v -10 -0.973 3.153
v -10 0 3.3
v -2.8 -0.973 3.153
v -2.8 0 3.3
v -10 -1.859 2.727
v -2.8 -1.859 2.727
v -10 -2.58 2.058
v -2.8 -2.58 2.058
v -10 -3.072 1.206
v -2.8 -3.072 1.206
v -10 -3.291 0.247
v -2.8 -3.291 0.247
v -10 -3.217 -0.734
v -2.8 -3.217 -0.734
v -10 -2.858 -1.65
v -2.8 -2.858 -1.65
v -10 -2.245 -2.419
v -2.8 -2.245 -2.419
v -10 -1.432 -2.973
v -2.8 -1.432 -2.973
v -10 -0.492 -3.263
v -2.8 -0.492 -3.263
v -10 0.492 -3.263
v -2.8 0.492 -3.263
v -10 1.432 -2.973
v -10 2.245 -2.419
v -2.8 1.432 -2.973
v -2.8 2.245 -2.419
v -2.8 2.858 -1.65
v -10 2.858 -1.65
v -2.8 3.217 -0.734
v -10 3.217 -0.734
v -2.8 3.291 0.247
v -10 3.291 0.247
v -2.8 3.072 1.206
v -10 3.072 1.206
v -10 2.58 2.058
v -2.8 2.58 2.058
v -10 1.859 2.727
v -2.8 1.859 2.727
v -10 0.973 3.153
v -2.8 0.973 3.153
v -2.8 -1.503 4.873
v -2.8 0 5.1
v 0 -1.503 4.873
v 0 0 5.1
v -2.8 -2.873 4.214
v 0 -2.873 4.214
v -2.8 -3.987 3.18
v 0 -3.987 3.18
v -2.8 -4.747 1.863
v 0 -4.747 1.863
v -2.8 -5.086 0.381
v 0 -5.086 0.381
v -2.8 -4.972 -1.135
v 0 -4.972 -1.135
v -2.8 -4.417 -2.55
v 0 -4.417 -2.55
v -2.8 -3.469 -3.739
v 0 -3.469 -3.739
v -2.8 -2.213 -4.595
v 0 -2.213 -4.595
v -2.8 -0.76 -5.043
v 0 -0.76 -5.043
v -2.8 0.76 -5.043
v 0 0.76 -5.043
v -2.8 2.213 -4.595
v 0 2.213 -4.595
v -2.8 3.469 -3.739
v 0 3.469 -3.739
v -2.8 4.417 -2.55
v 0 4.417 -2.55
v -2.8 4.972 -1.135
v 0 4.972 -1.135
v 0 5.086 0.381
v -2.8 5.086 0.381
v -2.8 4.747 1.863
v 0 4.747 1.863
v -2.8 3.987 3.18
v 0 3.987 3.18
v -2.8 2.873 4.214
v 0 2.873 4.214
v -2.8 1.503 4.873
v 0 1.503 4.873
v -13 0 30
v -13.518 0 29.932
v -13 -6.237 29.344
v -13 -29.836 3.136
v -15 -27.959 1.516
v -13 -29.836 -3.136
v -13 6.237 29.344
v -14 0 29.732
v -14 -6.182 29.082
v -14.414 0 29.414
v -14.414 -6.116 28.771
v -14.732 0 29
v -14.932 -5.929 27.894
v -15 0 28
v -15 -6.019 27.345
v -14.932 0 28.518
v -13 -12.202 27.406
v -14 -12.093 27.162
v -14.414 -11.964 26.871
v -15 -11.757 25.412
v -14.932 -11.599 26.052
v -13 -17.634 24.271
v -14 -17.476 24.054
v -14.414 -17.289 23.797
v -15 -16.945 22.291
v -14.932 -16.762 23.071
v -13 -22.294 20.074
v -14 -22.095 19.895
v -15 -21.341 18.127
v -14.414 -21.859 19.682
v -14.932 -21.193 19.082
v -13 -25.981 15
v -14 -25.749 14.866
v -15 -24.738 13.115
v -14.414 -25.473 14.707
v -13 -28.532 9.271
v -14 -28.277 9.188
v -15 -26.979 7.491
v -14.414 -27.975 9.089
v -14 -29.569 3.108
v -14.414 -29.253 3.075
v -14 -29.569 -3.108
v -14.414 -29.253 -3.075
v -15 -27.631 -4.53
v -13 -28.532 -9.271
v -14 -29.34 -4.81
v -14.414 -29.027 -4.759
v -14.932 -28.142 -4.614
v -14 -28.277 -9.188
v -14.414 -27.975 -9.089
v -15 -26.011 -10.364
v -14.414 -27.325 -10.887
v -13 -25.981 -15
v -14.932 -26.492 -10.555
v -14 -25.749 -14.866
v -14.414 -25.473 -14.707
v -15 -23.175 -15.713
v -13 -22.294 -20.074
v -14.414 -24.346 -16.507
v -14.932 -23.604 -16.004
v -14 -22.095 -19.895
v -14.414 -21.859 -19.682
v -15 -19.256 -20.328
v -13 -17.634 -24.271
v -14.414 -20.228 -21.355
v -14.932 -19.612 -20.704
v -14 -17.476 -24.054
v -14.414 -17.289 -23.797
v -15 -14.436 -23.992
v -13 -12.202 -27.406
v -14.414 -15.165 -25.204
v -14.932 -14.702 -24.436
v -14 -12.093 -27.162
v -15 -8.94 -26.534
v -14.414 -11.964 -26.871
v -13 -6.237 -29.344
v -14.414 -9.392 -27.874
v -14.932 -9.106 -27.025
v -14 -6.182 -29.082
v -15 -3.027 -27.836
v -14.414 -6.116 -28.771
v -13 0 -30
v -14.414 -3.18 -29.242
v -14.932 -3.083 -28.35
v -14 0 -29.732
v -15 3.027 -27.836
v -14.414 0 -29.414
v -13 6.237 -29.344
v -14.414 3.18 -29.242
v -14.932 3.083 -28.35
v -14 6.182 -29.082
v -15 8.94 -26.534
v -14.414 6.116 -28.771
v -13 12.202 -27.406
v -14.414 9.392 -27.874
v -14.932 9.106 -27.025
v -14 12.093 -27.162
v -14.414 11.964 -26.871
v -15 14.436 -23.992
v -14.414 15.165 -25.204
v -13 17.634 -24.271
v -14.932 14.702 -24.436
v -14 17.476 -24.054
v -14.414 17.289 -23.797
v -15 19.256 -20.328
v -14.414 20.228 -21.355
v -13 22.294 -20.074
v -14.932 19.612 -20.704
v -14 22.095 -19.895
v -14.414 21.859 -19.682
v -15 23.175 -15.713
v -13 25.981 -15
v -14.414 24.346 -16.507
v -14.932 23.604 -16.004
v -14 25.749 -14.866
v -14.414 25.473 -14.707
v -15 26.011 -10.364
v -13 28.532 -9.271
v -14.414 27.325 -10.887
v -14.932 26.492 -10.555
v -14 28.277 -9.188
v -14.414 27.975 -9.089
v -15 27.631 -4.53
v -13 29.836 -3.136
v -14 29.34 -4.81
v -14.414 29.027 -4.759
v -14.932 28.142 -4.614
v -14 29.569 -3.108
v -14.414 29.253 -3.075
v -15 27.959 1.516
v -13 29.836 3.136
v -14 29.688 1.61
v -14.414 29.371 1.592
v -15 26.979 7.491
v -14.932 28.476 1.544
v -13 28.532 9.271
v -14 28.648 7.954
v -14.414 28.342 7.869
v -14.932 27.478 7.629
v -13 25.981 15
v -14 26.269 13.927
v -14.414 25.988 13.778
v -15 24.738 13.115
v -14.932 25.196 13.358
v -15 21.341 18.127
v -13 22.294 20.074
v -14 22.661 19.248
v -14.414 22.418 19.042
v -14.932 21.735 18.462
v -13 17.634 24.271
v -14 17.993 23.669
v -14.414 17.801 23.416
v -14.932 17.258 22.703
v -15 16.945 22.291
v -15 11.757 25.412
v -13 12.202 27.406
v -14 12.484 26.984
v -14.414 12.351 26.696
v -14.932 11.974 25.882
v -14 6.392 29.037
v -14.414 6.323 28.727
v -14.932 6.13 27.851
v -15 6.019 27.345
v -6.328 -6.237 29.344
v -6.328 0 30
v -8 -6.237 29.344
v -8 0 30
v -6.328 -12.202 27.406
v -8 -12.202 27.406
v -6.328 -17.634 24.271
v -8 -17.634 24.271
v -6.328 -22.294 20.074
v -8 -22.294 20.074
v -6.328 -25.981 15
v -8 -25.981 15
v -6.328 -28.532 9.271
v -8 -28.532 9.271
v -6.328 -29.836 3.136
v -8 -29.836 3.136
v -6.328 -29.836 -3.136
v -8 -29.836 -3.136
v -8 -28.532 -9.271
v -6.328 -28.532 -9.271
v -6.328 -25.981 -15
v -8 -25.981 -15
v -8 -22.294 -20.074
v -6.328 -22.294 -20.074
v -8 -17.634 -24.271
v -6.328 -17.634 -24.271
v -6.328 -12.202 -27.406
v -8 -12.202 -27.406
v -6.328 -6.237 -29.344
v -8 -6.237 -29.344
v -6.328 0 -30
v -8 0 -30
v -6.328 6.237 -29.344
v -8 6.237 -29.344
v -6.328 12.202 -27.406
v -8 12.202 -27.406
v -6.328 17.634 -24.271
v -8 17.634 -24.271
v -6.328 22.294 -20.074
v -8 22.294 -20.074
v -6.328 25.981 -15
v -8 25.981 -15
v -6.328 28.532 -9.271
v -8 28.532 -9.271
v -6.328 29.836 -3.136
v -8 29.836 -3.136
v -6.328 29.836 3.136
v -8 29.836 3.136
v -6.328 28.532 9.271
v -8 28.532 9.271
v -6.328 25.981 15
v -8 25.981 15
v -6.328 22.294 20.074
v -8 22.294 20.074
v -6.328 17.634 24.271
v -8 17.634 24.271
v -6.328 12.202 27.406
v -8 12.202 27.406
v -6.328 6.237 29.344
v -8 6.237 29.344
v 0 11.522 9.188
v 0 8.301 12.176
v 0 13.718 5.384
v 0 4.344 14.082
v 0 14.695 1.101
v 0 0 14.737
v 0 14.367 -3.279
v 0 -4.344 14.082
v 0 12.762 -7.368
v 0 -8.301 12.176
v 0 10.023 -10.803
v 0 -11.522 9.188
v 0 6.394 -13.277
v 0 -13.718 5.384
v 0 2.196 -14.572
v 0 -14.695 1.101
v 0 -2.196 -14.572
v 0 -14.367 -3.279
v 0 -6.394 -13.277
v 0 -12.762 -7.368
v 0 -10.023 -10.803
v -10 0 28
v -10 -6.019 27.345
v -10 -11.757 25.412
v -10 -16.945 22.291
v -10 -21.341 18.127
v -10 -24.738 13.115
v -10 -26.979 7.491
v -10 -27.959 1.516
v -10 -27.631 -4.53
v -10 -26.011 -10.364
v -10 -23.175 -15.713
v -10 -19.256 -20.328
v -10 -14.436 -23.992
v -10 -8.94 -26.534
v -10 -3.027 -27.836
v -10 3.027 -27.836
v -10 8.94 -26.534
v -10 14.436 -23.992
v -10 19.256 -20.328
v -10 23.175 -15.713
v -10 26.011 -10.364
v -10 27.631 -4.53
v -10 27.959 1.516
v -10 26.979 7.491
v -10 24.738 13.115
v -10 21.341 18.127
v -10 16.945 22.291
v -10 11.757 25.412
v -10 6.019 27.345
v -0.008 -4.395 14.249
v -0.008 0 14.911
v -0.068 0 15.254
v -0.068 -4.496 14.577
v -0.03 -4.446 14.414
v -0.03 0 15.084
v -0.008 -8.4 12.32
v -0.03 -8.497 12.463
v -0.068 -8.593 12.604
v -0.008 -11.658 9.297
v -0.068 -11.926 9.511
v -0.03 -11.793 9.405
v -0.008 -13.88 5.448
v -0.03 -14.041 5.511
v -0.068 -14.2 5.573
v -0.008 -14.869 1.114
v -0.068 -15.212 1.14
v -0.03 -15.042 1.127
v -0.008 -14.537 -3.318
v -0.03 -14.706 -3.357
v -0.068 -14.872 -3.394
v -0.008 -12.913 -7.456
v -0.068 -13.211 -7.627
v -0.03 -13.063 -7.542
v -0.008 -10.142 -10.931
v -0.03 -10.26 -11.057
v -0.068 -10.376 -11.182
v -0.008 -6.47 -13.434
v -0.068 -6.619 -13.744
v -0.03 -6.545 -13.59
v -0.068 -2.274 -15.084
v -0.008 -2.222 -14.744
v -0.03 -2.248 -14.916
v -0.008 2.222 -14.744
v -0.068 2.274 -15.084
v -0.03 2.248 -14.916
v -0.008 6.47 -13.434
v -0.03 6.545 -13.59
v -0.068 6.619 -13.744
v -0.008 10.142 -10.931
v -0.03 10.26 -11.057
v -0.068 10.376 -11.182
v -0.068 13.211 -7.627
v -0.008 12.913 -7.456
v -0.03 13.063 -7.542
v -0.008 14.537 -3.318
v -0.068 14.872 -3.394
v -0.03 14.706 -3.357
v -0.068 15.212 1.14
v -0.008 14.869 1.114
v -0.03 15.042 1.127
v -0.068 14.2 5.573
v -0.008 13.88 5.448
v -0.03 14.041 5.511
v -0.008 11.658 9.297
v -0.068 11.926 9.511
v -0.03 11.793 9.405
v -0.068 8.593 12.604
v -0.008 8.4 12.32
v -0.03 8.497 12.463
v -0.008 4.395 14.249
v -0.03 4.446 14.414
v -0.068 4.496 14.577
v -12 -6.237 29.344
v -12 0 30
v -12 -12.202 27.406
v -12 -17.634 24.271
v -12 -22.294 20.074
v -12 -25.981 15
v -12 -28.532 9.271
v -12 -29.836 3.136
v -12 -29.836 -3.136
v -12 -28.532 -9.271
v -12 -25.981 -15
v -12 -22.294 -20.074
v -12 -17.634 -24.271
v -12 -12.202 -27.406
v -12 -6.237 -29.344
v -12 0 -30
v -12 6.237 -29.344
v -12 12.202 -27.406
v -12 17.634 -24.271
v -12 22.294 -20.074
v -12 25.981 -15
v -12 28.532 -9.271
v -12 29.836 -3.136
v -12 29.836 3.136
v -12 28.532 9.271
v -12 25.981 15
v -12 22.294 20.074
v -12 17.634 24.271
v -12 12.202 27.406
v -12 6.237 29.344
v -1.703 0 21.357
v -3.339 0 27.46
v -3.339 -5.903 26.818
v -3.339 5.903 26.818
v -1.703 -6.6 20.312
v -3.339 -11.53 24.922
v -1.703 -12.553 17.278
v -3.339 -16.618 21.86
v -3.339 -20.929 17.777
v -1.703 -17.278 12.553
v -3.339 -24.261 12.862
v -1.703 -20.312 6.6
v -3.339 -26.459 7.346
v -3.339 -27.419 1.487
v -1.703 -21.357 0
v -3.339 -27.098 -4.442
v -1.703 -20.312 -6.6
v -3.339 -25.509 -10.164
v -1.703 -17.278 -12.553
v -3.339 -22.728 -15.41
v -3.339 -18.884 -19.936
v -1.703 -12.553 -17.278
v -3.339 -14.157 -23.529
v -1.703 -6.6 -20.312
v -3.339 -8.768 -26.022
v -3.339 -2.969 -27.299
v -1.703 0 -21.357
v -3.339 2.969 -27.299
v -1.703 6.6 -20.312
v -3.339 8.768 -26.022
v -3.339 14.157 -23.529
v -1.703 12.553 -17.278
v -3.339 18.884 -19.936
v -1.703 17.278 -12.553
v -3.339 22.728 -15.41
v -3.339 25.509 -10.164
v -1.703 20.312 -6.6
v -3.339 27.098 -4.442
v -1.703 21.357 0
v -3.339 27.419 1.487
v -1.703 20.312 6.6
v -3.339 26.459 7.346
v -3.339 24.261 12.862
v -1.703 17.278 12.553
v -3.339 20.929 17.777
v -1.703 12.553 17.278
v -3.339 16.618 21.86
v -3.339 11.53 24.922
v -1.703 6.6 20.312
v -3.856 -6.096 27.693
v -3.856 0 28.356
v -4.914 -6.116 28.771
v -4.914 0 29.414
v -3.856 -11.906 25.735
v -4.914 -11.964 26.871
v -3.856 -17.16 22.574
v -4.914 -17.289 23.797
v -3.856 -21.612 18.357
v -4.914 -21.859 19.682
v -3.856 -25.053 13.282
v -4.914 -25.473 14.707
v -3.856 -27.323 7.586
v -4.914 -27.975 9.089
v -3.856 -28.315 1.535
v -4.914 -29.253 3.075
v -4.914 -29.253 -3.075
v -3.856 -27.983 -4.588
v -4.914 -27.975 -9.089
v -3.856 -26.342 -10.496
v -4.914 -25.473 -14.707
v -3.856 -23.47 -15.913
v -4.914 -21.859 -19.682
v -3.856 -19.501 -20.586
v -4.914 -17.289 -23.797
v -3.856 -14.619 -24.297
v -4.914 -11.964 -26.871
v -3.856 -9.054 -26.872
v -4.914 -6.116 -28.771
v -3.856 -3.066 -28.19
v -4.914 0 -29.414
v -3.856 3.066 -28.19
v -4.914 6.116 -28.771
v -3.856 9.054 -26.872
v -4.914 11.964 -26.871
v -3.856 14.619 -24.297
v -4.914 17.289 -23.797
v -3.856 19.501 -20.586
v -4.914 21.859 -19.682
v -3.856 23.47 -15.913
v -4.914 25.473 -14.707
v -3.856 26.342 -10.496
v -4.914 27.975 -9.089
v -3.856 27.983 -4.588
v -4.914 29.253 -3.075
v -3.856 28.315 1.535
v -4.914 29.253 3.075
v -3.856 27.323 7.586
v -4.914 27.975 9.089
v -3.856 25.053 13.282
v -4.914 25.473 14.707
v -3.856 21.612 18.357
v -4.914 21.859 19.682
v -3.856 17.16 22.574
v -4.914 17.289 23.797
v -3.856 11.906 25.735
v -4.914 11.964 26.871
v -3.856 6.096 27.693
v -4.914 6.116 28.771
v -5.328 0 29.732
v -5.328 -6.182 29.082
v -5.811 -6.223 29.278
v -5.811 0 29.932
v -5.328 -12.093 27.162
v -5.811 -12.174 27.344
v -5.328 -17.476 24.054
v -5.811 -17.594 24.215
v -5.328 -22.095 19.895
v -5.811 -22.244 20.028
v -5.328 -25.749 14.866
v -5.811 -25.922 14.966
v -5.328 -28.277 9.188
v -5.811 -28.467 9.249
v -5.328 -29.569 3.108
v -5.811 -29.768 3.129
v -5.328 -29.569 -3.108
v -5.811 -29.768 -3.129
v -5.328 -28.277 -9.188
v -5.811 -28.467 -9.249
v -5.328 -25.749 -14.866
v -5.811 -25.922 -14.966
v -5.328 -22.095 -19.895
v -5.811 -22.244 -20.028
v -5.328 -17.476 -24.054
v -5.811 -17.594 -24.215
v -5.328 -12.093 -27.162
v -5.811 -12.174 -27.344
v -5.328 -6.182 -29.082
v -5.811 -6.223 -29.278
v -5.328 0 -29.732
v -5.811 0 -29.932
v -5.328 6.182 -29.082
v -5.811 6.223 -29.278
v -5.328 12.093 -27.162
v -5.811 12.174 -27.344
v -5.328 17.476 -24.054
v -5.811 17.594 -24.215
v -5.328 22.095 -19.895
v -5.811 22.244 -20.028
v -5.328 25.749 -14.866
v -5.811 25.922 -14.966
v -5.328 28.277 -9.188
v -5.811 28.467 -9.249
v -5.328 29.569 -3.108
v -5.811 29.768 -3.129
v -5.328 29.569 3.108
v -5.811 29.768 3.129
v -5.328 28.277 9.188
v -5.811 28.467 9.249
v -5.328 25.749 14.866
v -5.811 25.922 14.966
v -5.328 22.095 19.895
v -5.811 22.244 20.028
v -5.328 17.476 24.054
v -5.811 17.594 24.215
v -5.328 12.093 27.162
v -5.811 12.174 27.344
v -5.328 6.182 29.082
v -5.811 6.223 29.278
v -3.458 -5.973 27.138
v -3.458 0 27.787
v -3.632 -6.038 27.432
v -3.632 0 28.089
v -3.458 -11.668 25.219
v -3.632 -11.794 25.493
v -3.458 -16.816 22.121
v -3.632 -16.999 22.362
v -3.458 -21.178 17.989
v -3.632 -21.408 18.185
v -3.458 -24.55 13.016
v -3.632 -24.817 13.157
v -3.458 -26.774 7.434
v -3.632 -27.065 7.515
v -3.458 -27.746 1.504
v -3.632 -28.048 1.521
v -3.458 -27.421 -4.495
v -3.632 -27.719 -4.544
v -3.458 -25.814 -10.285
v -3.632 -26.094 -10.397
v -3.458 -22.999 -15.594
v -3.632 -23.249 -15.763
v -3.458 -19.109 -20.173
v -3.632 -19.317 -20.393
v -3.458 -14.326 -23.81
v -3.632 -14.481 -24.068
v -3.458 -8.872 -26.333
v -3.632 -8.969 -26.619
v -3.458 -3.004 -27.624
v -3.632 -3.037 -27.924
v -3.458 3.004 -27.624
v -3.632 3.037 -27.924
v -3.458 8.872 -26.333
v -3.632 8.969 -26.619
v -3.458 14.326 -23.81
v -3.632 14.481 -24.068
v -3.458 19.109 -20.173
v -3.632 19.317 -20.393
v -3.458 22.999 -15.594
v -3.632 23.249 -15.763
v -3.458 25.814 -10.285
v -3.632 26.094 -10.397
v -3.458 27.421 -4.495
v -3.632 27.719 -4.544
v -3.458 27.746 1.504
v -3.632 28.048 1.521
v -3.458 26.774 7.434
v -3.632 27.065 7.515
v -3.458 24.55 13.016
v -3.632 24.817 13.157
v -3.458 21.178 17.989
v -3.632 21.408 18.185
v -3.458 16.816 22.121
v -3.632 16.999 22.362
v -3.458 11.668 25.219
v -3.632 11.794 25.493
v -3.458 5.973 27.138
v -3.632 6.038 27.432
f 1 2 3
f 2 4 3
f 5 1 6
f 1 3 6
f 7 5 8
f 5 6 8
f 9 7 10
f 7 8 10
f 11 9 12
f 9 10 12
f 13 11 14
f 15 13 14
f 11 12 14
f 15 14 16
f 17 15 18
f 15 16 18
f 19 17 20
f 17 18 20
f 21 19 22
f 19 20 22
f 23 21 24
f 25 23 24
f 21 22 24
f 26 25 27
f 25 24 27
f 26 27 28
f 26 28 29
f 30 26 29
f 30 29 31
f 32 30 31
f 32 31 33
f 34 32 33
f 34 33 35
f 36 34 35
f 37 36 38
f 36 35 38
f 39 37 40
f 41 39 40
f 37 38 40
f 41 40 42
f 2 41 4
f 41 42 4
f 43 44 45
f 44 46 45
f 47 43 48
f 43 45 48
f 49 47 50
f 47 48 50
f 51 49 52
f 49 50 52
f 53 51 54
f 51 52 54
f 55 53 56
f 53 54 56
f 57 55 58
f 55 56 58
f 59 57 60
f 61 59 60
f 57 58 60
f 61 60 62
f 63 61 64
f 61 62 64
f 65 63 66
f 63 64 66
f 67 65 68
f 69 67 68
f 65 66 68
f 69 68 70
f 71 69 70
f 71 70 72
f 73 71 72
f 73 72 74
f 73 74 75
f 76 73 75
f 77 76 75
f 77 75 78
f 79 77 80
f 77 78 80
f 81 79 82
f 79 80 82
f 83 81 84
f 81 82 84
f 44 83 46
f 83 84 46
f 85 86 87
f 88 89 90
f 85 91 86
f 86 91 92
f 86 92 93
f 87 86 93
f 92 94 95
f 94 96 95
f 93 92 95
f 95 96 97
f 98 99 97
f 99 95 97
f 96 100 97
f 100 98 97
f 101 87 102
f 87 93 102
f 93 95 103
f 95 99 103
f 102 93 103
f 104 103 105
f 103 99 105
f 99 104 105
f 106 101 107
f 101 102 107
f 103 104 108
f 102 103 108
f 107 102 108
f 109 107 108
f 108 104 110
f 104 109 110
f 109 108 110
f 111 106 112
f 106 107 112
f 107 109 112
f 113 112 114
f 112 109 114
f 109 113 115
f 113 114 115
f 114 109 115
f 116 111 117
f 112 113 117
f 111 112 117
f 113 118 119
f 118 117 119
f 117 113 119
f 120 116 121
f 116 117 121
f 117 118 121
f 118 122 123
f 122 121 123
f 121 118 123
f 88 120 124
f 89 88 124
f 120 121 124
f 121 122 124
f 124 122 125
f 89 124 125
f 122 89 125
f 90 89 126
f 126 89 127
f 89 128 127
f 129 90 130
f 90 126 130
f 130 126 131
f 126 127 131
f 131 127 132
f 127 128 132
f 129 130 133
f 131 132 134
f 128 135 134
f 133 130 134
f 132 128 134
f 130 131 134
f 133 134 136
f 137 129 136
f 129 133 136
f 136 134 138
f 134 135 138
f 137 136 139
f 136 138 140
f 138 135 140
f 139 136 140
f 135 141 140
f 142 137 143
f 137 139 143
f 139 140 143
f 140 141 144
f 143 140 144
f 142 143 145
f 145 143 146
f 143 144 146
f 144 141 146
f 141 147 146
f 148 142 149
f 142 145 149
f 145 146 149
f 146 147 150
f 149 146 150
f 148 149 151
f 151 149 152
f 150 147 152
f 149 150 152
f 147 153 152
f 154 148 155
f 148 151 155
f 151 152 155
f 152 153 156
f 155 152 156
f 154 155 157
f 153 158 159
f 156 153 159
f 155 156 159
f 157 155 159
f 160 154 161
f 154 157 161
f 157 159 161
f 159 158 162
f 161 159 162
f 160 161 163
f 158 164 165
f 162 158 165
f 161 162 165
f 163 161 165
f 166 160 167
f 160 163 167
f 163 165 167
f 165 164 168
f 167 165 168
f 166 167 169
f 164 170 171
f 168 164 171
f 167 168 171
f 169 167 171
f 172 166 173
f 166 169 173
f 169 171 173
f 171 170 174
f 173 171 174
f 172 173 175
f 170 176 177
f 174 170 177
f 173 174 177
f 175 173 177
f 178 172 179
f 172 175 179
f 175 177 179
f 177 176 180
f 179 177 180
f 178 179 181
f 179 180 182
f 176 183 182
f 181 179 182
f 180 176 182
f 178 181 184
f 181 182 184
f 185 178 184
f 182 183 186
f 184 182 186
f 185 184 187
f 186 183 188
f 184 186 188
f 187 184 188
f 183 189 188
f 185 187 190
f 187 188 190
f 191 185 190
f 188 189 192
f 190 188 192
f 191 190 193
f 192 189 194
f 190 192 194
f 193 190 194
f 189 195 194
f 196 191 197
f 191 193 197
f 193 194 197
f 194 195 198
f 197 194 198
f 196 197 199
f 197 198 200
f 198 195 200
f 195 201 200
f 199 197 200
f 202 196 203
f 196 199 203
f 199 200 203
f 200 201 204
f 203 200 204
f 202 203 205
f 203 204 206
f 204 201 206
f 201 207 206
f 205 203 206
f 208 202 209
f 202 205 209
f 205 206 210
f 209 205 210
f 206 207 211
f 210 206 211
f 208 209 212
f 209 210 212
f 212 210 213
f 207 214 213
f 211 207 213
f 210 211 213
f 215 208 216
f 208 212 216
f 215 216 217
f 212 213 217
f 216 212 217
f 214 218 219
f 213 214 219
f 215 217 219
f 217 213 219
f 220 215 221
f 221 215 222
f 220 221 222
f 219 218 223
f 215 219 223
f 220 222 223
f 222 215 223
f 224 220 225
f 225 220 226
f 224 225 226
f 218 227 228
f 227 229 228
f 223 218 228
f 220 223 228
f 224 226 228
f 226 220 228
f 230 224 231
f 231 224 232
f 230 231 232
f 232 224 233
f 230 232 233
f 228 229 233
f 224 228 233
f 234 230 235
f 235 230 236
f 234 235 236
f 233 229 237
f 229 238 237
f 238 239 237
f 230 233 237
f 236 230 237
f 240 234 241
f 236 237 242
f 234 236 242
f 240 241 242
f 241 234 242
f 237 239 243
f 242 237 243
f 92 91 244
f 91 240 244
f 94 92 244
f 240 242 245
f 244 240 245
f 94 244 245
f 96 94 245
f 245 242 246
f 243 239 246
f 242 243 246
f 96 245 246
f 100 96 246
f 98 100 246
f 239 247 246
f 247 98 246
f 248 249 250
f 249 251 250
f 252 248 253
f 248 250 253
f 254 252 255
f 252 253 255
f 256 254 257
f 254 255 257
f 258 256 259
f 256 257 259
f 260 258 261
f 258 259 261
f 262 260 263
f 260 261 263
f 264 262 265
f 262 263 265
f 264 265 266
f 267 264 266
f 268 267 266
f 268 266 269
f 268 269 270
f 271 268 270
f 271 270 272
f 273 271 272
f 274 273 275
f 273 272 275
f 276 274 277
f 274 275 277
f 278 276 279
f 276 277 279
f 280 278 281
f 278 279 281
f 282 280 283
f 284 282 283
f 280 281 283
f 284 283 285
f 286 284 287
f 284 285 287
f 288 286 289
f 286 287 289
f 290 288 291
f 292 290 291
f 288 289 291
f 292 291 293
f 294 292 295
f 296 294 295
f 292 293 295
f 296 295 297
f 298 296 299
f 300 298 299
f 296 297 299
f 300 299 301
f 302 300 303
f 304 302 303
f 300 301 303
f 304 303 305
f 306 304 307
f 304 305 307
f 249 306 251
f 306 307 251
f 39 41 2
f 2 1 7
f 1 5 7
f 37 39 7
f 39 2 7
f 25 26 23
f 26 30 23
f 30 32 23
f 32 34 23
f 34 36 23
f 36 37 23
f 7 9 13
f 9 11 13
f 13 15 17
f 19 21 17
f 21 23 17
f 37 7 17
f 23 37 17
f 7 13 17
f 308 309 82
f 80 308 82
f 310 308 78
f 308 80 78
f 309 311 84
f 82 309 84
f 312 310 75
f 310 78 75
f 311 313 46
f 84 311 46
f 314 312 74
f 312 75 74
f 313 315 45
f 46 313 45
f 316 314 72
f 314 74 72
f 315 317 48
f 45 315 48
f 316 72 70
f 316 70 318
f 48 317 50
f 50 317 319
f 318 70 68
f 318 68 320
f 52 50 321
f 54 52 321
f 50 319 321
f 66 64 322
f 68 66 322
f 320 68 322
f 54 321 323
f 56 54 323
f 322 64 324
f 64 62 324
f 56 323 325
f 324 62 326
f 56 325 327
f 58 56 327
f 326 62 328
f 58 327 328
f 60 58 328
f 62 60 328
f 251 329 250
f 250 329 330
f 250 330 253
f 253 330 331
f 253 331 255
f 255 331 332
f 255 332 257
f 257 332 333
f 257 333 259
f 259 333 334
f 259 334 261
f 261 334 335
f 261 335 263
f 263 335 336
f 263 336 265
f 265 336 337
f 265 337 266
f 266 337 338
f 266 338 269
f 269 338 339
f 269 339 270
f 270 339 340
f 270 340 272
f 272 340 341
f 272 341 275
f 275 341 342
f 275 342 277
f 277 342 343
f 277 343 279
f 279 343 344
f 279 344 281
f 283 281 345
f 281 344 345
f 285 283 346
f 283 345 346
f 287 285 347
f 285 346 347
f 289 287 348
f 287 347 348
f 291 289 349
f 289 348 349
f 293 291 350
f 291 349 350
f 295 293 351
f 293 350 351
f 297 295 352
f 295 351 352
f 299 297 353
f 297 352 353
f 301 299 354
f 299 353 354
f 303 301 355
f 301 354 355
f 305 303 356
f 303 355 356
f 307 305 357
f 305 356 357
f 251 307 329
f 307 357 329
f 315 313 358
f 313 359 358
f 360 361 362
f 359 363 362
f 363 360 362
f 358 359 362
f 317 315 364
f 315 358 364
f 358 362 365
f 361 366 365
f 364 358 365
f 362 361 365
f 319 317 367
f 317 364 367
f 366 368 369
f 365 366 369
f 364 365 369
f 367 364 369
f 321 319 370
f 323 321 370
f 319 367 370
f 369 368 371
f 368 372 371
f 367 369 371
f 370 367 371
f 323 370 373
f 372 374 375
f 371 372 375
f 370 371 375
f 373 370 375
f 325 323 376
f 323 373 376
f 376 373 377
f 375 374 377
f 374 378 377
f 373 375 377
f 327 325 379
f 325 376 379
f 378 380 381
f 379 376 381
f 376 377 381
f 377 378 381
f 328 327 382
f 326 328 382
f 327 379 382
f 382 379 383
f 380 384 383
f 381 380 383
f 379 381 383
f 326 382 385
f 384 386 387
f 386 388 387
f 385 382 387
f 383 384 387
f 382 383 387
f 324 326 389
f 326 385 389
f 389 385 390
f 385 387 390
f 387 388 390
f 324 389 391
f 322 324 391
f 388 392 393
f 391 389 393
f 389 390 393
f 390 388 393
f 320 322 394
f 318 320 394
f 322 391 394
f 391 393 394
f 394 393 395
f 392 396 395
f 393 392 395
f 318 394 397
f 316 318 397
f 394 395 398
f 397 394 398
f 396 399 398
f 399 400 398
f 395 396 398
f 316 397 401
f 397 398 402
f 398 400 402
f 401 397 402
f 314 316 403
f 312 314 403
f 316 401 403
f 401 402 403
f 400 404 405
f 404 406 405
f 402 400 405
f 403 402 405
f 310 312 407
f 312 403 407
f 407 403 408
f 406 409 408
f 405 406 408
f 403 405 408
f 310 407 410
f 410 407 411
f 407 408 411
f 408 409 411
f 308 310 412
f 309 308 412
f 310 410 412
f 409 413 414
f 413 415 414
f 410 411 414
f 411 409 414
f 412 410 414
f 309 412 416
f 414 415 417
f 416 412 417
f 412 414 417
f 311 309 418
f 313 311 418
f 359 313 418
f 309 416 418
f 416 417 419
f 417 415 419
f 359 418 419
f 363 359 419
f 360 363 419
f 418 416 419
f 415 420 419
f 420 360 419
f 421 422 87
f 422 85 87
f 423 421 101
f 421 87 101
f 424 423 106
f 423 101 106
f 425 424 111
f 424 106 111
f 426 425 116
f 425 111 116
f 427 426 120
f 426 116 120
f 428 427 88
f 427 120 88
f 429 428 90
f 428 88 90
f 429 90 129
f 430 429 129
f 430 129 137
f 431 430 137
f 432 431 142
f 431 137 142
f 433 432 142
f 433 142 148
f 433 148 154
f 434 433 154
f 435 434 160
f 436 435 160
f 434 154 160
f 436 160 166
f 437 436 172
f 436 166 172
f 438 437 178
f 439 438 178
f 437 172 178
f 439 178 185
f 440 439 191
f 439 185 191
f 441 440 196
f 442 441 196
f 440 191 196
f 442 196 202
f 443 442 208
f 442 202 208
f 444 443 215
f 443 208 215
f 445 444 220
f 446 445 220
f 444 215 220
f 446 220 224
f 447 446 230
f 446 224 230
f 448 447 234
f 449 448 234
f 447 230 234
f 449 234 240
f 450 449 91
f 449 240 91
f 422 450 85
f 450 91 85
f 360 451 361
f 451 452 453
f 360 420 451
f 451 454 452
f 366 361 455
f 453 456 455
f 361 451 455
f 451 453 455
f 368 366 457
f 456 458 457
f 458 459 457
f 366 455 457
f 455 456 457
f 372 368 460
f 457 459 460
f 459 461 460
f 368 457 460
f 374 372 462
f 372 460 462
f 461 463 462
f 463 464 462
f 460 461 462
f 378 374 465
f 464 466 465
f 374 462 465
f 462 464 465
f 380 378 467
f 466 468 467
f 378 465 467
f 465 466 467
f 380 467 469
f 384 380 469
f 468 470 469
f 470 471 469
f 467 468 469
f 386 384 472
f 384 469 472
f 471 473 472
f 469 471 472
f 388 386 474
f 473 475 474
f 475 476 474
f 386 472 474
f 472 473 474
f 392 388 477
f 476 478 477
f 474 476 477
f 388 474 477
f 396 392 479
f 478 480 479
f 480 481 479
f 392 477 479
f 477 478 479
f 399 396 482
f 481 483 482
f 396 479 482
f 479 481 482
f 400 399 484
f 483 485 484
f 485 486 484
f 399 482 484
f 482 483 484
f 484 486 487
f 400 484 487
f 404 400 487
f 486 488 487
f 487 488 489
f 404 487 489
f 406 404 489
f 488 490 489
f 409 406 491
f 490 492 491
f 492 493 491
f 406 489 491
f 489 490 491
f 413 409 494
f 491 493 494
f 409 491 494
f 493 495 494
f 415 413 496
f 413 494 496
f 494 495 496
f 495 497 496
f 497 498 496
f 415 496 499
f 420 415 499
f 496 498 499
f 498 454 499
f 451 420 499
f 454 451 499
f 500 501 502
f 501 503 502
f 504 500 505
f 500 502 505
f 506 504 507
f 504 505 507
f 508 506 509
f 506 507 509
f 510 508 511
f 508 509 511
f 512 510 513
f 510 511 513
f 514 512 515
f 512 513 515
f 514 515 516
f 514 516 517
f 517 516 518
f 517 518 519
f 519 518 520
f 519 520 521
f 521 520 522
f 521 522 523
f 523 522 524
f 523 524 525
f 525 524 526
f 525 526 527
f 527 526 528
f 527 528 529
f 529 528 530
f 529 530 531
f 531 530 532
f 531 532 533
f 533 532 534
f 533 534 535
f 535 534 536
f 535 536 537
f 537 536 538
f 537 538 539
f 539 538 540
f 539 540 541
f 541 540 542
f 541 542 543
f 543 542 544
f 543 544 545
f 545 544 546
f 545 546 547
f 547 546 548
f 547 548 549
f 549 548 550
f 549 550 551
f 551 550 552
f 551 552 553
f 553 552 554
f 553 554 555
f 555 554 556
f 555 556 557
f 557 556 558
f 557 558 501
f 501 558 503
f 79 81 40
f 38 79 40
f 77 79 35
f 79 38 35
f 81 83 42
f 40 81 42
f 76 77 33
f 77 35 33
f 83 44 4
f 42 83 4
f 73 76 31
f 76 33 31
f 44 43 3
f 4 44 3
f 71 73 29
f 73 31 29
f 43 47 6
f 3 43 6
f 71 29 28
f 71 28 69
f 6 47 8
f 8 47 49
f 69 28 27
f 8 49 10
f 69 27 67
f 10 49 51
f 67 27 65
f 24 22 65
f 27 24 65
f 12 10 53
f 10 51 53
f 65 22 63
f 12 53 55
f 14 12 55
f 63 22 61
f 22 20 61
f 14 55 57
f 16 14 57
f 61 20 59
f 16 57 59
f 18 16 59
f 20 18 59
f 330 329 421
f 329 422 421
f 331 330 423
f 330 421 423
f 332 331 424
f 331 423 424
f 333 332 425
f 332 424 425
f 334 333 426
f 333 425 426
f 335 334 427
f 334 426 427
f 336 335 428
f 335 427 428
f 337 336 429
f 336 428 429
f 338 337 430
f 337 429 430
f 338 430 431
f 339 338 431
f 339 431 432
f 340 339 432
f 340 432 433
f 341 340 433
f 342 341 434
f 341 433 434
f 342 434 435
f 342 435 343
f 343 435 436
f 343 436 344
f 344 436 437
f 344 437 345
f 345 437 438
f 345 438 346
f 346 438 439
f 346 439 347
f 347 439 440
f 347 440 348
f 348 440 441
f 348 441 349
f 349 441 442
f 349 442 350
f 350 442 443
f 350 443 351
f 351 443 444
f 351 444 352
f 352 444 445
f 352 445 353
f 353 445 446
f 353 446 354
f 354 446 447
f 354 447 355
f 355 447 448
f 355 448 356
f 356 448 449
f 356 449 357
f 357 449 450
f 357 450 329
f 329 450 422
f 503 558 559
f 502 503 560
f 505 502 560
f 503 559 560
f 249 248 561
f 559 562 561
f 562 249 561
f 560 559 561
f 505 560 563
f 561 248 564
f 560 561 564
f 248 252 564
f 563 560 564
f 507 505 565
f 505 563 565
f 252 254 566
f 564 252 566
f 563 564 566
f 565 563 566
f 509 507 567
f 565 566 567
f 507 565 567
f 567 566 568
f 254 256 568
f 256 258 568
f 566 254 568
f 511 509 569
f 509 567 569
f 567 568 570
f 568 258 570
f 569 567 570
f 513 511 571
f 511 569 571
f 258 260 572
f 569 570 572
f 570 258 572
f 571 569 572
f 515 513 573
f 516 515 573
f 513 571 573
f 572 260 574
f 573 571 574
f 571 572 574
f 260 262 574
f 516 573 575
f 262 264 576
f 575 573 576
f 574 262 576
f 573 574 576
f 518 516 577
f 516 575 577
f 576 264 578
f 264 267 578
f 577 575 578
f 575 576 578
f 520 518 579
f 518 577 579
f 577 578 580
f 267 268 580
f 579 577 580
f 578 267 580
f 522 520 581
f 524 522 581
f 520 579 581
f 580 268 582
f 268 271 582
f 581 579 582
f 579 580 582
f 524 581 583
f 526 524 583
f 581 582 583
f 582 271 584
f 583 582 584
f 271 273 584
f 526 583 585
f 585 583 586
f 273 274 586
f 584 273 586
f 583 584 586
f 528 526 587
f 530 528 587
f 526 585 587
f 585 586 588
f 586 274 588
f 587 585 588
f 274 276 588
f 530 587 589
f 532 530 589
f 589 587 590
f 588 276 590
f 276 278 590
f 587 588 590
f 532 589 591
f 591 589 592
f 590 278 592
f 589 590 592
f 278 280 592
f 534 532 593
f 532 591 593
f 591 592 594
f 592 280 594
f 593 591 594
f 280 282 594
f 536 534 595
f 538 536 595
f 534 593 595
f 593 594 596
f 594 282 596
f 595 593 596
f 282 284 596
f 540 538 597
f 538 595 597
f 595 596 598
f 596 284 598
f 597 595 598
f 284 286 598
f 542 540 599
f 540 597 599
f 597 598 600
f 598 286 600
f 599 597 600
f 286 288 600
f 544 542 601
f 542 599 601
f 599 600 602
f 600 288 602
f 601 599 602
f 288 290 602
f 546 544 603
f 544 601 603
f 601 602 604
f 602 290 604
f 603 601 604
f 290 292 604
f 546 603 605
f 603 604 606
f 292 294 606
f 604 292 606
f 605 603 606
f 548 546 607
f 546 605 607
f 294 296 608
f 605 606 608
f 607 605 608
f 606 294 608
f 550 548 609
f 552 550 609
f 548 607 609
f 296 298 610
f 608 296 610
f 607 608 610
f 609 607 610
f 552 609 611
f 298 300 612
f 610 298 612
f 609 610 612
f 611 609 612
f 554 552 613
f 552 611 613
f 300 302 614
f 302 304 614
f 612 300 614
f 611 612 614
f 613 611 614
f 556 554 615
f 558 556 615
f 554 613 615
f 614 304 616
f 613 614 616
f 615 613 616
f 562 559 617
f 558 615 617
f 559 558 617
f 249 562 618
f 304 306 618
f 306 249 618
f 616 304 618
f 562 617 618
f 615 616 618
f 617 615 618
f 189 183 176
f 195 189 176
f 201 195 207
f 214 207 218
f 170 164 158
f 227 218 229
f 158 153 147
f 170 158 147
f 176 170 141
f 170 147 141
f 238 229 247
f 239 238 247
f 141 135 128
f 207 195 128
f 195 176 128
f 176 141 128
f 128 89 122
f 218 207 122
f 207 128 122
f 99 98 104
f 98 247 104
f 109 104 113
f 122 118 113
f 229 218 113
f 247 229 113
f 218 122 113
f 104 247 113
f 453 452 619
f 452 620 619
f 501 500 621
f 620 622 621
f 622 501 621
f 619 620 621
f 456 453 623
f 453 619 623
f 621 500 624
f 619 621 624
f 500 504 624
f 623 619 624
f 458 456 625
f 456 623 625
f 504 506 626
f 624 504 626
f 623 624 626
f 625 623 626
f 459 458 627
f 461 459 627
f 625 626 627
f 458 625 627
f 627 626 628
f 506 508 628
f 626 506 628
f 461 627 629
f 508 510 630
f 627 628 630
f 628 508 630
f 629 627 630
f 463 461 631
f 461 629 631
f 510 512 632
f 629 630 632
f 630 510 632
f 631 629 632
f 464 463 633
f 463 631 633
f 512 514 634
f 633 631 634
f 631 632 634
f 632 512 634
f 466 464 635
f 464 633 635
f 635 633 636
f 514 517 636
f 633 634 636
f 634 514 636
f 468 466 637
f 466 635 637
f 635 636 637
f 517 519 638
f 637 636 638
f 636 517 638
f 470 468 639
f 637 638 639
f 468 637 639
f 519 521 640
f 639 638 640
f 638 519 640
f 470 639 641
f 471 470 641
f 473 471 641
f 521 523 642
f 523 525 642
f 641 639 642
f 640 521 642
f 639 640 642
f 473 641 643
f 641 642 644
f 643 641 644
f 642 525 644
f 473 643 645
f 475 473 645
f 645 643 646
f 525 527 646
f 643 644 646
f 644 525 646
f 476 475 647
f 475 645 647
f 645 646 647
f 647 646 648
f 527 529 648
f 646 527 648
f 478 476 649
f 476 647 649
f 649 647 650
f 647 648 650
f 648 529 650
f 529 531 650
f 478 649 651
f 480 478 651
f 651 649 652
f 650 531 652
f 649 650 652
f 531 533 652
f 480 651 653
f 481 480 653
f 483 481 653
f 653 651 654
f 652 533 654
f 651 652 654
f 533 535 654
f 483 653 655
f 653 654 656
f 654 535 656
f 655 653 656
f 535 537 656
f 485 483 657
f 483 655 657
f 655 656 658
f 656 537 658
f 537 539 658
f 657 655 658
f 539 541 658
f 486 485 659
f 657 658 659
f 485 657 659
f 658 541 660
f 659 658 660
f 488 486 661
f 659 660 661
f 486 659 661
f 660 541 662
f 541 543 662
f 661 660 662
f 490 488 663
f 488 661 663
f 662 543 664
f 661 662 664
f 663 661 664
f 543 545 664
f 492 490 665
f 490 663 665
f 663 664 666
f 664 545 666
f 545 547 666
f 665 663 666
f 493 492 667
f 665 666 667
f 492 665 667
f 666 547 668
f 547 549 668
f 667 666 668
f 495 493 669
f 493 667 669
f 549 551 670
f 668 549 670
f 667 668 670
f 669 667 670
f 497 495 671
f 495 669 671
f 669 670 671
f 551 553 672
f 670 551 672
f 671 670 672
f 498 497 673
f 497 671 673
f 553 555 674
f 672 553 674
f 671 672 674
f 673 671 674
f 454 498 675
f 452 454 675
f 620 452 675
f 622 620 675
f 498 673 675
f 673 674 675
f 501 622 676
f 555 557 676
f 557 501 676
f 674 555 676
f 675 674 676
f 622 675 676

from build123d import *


with BuildPart() as f1:
    # F0 (on Front) → F1 (revolve)
    with BuildSketch(Plane.XZ):
        with BuildLine():
            ThreePointArc((0, 14.736695), (-0.01711, 14.997747), (-0.068148, 15.254333))
            Line((-0.068148, 15.254333), (-3.338541, 27.459603))
            ThreePointArc((-3.338541, 27.459603), (-3.538341, 27.941965), (-3.856179, 28.356179))
            Line((-3.856179, 28.356179), (-4.914214, 29.414214))
            ThreePointArc((-4.914214, 29.414214), (-5.56306, 29.847759), (-6.328427, 30))
            Line((-6.328427, 30), (-8, 30))
            Line((-8, 30), (-10, 28))
            Line((-10, 28), (-12, 30))
            Line((-12, 30), (-13, 30))
            ThreePointArc((-13, 30), (-14.4142, 29.414227), (-15, 28.000038))
            Line((-15, 28.000038), (-15, 0))
            Line((-15, 0), (-10, 0))
            Line((-10, 0), (-10, 3.3))
            Line((-10, 3.3), (-2.8, 3.3))
            Line((-2.8, 3.3), (-2.8, 5.1))
            Line((-2.8, 5.1), (0, 5.1))
            Line((0, 5.1), (0, 14.736695))
        make_face()
    revolve(axis=Axis((-0.70766, 0, 0), (1, 0, 0)))


solid = f1.part
